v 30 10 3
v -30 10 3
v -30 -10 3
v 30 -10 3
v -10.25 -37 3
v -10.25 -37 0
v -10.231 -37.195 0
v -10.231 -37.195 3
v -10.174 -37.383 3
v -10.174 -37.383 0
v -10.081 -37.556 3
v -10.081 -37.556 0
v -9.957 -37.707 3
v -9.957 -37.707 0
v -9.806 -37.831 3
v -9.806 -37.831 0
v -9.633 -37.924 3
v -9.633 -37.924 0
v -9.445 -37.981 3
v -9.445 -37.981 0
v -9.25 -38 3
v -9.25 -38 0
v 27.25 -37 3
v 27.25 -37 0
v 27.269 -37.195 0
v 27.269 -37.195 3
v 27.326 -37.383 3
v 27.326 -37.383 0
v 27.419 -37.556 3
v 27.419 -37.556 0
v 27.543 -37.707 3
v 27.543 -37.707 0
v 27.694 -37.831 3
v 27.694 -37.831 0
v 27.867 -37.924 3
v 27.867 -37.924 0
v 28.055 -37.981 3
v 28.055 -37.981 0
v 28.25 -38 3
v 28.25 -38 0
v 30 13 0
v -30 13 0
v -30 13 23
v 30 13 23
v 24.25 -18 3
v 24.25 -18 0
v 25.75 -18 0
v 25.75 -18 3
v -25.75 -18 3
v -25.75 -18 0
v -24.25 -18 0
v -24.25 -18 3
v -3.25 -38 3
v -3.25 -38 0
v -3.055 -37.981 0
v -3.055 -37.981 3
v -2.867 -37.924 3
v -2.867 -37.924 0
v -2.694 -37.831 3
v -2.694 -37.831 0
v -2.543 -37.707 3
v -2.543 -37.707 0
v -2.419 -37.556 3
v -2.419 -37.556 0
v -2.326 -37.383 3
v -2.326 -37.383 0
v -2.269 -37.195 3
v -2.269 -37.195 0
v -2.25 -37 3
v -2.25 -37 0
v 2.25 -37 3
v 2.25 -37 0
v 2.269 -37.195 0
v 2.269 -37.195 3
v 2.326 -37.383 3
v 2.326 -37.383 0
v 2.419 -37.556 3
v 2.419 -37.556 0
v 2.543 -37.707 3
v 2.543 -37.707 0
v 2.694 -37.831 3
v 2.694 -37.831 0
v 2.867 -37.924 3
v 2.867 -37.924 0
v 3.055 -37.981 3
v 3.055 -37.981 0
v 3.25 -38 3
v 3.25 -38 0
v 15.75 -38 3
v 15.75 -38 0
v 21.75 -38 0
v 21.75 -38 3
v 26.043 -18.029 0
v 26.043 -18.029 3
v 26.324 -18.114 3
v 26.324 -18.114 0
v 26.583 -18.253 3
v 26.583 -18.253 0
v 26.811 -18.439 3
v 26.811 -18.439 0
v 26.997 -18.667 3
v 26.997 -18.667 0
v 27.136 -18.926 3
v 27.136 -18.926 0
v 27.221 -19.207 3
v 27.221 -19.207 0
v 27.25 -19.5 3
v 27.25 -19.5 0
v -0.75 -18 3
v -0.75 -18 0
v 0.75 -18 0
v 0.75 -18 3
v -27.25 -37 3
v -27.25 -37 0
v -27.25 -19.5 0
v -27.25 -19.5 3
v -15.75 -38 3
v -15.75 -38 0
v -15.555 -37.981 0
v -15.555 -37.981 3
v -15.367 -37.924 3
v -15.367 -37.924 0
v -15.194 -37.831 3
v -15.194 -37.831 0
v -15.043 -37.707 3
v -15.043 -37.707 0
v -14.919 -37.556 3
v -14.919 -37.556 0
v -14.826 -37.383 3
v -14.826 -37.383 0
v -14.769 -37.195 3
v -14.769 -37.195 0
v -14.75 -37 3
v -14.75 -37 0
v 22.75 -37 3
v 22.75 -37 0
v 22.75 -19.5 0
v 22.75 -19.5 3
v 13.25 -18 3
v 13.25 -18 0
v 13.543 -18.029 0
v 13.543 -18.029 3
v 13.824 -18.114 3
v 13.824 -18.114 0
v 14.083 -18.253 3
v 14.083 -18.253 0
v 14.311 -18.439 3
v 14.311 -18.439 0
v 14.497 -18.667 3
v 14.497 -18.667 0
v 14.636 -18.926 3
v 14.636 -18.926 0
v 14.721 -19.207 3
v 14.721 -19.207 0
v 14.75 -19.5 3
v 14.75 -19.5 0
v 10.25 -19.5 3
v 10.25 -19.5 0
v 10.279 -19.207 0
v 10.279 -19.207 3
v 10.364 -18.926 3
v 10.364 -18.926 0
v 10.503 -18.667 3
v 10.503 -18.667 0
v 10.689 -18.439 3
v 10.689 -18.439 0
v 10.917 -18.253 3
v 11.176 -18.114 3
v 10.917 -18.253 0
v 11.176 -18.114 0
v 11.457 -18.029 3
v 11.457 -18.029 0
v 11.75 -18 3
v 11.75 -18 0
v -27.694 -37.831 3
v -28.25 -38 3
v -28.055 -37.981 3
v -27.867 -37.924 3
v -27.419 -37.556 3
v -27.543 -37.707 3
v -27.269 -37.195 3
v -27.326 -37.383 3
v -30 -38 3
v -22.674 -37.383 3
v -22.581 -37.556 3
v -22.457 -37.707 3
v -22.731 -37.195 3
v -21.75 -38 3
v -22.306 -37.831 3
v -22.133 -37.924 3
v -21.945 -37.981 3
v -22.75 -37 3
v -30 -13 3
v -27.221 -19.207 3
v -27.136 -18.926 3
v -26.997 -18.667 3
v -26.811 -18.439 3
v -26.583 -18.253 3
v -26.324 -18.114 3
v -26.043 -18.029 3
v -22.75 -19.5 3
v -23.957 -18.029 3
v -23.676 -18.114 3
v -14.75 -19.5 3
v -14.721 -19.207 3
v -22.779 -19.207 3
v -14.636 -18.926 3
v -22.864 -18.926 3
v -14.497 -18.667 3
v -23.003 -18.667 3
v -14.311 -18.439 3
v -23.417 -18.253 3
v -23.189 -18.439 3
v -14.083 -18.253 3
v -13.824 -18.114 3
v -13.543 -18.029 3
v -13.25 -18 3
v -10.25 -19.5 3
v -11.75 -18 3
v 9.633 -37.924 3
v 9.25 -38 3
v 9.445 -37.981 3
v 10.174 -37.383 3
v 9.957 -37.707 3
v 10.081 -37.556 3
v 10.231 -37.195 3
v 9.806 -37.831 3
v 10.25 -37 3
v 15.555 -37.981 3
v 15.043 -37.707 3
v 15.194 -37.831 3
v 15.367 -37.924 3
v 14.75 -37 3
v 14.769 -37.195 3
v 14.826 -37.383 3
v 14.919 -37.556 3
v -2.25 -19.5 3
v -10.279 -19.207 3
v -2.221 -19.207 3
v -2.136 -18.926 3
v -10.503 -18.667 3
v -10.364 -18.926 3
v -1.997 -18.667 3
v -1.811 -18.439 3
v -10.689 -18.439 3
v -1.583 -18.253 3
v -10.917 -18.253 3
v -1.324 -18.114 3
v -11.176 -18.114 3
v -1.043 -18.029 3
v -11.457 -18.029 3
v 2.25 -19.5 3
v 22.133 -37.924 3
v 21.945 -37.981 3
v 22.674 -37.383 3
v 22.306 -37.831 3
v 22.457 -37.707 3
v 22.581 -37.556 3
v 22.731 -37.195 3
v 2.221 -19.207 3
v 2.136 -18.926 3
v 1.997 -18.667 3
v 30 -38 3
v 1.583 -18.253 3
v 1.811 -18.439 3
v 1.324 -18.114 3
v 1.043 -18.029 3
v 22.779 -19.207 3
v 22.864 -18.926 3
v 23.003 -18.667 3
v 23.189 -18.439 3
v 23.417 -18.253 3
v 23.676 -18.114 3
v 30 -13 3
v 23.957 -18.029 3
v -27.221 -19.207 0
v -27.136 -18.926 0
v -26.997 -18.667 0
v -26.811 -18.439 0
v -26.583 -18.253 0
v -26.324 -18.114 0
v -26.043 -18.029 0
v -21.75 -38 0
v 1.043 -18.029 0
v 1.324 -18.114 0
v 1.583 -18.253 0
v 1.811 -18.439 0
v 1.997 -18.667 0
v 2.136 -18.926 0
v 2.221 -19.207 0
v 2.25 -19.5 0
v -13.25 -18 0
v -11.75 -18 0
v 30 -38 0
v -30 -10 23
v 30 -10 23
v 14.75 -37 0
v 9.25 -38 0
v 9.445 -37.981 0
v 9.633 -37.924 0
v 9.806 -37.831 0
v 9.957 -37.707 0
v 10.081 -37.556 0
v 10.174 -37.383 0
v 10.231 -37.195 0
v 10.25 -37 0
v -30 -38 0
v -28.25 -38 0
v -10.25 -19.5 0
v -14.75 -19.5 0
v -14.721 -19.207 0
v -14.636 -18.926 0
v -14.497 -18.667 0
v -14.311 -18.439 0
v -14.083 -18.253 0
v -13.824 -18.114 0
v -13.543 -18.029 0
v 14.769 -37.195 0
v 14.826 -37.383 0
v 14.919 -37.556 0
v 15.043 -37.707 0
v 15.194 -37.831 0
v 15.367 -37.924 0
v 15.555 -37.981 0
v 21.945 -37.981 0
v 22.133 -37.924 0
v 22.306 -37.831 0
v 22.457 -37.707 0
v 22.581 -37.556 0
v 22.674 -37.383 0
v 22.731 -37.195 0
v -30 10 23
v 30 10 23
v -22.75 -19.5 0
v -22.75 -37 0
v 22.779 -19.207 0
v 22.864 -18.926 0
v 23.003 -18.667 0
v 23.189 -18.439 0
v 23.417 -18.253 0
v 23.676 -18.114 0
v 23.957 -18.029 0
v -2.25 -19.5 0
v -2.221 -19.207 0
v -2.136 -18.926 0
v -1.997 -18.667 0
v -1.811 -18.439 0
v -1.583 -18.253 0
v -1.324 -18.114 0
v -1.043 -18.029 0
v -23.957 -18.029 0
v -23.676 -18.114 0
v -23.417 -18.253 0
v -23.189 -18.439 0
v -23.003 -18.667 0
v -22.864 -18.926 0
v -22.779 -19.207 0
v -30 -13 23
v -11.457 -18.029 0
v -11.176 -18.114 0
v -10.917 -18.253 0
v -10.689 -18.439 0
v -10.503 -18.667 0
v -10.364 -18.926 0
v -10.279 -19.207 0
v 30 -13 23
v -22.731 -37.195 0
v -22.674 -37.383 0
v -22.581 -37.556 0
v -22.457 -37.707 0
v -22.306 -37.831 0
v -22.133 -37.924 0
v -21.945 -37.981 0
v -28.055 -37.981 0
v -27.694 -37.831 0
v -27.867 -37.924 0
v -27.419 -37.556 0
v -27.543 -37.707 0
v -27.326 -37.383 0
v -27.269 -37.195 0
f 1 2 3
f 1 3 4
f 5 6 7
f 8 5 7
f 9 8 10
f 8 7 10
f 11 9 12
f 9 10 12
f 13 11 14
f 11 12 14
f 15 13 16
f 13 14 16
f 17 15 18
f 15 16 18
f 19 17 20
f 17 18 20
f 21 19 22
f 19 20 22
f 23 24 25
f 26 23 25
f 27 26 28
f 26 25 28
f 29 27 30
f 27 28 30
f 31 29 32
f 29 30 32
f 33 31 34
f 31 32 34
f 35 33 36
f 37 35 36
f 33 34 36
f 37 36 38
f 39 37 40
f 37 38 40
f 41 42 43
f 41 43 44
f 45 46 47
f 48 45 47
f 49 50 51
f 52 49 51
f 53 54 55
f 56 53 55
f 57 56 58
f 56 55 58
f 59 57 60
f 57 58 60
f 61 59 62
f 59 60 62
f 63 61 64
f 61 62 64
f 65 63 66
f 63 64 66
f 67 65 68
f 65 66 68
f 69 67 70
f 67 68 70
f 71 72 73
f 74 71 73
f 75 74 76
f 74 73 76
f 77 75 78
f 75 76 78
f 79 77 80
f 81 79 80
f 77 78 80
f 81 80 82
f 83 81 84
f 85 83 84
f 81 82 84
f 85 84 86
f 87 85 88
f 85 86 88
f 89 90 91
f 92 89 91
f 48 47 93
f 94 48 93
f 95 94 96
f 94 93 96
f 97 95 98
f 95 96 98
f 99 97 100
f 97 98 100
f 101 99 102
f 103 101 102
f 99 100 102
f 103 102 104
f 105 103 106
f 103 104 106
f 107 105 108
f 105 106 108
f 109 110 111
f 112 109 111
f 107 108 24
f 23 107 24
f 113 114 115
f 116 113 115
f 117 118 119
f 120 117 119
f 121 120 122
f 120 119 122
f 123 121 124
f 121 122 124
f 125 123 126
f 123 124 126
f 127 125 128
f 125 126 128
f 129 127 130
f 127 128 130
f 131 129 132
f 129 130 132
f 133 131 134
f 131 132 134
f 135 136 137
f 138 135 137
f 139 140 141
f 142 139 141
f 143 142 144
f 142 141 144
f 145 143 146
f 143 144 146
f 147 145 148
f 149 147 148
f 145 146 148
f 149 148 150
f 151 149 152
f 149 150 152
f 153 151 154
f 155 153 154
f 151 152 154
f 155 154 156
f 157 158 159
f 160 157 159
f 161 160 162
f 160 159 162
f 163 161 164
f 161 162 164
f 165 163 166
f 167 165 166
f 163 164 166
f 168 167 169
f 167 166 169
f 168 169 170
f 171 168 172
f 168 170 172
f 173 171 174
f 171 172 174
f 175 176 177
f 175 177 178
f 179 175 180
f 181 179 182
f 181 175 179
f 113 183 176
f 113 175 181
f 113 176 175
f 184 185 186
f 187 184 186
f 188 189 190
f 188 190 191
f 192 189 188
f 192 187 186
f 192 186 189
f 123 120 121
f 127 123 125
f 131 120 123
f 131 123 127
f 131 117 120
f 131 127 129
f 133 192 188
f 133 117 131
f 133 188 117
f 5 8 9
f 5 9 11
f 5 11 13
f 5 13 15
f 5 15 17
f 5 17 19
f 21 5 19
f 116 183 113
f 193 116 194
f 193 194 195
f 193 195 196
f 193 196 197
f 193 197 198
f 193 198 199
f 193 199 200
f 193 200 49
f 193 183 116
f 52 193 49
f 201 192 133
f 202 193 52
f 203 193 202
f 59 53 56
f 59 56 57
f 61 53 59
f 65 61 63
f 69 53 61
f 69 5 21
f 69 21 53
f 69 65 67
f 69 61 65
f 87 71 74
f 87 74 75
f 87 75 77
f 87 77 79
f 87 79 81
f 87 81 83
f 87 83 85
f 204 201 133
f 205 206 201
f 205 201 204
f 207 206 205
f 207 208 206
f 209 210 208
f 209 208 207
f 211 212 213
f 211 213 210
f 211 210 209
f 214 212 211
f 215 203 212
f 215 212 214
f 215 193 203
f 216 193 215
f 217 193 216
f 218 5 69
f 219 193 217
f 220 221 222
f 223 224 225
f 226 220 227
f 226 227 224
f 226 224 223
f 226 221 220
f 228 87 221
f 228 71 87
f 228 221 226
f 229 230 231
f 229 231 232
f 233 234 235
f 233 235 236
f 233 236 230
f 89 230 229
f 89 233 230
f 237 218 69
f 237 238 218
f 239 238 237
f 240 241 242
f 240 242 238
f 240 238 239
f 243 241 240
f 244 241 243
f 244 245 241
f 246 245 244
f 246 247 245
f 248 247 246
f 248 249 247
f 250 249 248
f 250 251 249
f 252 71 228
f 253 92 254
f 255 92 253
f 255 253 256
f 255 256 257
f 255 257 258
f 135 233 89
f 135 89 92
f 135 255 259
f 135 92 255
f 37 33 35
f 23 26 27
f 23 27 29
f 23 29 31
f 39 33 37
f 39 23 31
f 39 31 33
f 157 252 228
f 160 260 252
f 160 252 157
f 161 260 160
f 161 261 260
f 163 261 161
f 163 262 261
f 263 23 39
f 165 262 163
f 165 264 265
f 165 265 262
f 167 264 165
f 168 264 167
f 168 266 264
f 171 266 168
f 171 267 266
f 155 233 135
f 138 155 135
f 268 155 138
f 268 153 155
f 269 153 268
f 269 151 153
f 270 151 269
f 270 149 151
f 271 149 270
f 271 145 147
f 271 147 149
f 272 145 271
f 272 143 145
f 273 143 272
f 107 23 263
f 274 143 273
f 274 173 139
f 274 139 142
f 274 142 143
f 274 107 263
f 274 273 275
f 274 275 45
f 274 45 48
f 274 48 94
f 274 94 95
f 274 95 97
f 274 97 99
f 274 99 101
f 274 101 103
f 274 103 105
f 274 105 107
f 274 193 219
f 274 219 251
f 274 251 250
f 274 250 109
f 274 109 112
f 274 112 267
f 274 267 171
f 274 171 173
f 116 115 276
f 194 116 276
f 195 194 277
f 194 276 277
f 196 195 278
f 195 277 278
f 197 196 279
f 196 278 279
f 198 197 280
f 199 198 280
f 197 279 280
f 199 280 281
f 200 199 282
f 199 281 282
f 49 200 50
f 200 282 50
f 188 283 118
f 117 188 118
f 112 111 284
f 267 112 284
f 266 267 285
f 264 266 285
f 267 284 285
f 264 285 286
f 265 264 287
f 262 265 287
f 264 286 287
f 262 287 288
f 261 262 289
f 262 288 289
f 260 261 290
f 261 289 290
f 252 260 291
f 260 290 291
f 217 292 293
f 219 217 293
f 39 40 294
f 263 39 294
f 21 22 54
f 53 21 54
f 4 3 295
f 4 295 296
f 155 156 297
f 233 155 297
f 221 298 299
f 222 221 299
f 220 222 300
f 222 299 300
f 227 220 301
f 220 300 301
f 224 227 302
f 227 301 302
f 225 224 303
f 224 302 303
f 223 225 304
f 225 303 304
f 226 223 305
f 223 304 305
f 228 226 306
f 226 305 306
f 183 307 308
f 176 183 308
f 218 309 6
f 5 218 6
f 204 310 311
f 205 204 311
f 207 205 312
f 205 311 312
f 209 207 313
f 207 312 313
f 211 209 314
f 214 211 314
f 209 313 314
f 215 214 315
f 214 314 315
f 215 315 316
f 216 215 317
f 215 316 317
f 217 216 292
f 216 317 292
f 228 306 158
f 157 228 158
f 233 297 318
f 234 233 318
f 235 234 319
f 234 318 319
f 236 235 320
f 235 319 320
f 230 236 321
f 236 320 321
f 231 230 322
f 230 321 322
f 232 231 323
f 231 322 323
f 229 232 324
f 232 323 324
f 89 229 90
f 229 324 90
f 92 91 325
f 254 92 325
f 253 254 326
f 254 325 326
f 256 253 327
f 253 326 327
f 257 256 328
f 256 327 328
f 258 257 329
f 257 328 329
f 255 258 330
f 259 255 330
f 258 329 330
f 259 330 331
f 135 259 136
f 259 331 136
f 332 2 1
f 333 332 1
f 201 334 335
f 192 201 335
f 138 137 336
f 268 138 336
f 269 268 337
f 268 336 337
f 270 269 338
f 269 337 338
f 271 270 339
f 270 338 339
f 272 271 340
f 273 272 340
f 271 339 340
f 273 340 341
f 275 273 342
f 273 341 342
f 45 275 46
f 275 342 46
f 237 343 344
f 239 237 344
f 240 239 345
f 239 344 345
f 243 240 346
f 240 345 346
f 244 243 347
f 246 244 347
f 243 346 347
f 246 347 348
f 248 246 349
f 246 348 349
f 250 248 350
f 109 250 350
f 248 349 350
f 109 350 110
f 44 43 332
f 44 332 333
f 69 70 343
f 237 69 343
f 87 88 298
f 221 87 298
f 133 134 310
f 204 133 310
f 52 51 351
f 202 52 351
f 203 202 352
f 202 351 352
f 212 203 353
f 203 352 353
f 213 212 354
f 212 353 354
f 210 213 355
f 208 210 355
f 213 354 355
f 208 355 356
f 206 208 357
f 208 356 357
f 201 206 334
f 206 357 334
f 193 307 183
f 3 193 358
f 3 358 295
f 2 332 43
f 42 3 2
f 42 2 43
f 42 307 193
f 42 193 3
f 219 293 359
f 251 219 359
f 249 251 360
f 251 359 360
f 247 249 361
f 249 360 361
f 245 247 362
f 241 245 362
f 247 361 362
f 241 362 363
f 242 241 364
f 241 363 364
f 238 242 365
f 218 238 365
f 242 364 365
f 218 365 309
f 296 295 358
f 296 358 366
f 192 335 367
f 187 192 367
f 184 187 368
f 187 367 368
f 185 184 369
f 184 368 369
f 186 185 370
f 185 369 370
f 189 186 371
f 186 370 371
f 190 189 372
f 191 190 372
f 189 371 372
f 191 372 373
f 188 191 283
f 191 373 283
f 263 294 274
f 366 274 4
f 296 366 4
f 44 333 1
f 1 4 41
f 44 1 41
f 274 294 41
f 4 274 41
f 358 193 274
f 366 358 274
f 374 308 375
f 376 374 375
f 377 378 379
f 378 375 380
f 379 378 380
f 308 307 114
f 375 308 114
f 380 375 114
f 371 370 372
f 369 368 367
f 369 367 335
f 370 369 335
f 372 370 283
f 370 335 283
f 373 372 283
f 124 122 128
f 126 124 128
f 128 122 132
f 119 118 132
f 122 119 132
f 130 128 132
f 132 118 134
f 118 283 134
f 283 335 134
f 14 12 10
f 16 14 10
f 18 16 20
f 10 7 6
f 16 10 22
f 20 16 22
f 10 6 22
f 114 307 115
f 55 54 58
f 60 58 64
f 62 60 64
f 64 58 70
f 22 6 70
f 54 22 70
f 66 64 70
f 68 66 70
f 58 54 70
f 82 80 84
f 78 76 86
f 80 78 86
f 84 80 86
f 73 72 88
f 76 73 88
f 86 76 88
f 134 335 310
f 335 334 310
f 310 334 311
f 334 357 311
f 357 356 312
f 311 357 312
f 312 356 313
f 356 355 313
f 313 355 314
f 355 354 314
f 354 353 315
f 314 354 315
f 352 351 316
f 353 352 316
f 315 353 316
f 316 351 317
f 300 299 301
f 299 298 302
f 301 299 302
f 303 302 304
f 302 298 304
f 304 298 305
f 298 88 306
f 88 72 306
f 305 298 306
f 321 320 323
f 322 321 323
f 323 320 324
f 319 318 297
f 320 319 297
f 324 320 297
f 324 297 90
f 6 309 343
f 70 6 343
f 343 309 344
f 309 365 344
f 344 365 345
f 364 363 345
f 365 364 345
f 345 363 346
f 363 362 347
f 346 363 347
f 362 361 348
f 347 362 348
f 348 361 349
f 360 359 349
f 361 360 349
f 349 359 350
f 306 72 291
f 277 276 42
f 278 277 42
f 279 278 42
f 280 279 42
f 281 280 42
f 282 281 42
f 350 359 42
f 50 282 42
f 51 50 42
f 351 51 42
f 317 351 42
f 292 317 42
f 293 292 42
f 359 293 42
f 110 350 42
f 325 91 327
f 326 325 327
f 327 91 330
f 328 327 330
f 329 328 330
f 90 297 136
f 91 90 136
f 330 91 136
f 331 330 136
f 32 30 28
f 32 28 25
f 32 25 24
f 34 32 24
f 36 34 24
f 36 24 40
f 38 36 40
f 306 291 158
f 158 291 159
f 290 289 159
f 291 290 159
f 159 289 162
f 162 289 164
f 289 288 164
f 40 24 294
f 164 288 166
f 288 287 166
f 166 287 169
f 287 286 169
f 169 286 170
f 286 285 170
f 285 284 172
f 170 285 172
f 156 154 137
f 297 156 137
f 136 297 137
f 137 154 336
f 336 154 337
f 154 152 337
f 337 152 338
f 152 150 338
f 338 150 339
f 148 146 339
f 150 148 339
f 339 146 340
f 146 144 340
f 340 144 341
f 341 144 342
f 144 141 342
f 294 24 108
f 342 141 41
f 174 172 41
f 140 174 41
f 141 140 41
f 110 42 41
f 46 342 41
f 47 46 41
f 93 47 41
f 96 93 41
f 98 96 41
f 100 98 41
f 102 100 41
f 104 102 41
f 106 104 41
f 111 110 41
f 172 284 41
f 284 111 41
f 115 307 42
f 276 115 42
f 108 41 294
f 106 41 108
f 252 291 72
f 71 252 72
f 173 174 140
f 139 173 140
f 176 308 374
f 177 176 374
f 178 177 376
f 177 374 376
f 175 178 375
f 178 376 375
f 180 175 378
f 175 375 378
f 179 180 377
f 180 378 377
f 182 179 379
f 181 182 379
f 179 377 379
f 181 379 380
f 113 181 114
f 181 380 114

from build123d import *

# Parameters (mm, degrees)
F0_W     = 60
F0_H     = 26
F1_DEPTH = 3
F2_W     = 60
F2_H     = 3
F3_DEPTH = 20
F4_W     = 60
F4_H     = 3
F5_DEPTH = 20


with BuildPart() as f1:
    # F0 (on Top) → F1 (new body)
    with BuildSketch(Plane.XY):
        Rectangle(F0_W, F0_H)
        with BuildLine():
            Line((30, -13), (-30, -13))
            Line((-30, -13), (-30, -38))
            Line((-30, -38), (-28.25, -38))
            ThreePointArc((-28.25, -38), (-27.5428932188, -37.7071067812), (-27.25, -37))
            Line((-27.25, -37), (-27.25, -19.5))
            ThreePointArc((-27.25, -19.5), (-26.8106601718, -18.4393398282), (-25.75, -18))
            Line((-25.75, -18), (-24.25, -18))
            ThreePointArc((-24.25, -18), (-23.1893398282, -18.4393398282), (-22.75, -19.5))
            Line((-22.75, -19.5), (-22.75, -37))
            ThreePointArc((-22.75, -37), (-22.4571067812, -37.7071067812), (-21.75, -38))
            Line((-21.75, -38), (-18.75, -38))
            Line((-18.75, -38), (-15.75, -38))
            ThreePointArc((-15.75, -38), (-15.0428932188, -37.7071067812), (-14.75, -37))
            Line((-14.75, -37), (-14.75, -19.5))
            ThreePointArc((-14.75, -19.5), (-14.3106601718, -18.4393398282), (-13.25, -18))
            Line((-13.25, -18), (-11.75, -18))
            ThreePointArc((-11.75, -18), (-10.6893398282, -18.4393398282), (-10.25, -19.5))
            Line((-10.25, -19.5), (-10.25, -37))
            ThreePointArc((-10.25, -37), (-9.9571067812, -37.7071067812), (-9.25, -38))
            Line((-9.25, -38), (-3.25, -38))
            ThreePointArc((-3.25, -38), (-2.5428932188, -37.7071067812), (-2.25, -37))
            Line((-2.25, -37), (-2.25, -19.5))
            ThreePointArc((-2.25, -19.5), (-1.8106601718, -18.4393398282), (-0.75, -18))
            Line((-0.75, -18), (0.75, -18))
            ThreePointArc((0.75, -18), (1.8106601718, -18.4393398282), (2.25, -19.5))
            Line((2.25, -19.5), (2.25, -37))
            ThreePointArc((2.25, -37), (2.5428932188, -37.7071067812), (3.25, -38))
            Line((3.25, -38), (9.25, -38))
            ThreePointArc((9.25, -38), (9.9571067812, -37.7071067812), (10.25, -37))
            Line((10.25, -37), (10.25, -19.5))
            ThreePointArc((10.25, -19.5), (10.6893398282, -18.4393398282), (11.75, -18))
            Line((11.75, -18), (13.25, -18))
            ThreePointArc((13.25, -18), (14.3106601718, -18.4393398282), (14.75, -19.5))
            Line((14.75, -19.5), (14.75, -37))
            ThreePointArc((14.75, -37), (15.0428932188, -37.7071067812), (15.75, -38))
            Line((15.75, -38), (21.75, -38))
            ThreePointArc((21.75, -38), (22.4571067812, -37.7071067812), (22.75, -37))
            Line((22.75, -37), (22.75, -19.5))
            ThreePointArc((22.75, -19.5), (23.1893398282, -18.4393398282), (24.25, -18))
            Line((24.25, -18), (25.75, -18))
            ThreePointArc((25.75, -18), (26.8106601718, -18.4393398282), (27.25, -19.5))
            Line((27.25, -19.5), (27.25, -37))
            ThreePointArc((27.25, -37), (27.5428932188, -37.7071067812), (28.25, -38))
            Line((28.25, -38), (30, -38))
            Line((30, -38), (30, -13))
        make_face()
    extrude(amount=F1_DEPTH)

    # F2 (on face) → F3 (join)
    with BuildSketch(Plane.XY.offset(3)):
        with Locations((0, 11.5)):
            Rectangle(F2_W, F2_H)
    extrude(amount=F3_DEPTH)

    # F4 (on face) → F5 (join)
    with BuildSketch(Plane.XY.offset(3)):
        with Locations((0, -11.5)):
            Rectangle(F4_W, F4_H)
    extrude(amount=F5_DEPTH)


solid = f1.part
